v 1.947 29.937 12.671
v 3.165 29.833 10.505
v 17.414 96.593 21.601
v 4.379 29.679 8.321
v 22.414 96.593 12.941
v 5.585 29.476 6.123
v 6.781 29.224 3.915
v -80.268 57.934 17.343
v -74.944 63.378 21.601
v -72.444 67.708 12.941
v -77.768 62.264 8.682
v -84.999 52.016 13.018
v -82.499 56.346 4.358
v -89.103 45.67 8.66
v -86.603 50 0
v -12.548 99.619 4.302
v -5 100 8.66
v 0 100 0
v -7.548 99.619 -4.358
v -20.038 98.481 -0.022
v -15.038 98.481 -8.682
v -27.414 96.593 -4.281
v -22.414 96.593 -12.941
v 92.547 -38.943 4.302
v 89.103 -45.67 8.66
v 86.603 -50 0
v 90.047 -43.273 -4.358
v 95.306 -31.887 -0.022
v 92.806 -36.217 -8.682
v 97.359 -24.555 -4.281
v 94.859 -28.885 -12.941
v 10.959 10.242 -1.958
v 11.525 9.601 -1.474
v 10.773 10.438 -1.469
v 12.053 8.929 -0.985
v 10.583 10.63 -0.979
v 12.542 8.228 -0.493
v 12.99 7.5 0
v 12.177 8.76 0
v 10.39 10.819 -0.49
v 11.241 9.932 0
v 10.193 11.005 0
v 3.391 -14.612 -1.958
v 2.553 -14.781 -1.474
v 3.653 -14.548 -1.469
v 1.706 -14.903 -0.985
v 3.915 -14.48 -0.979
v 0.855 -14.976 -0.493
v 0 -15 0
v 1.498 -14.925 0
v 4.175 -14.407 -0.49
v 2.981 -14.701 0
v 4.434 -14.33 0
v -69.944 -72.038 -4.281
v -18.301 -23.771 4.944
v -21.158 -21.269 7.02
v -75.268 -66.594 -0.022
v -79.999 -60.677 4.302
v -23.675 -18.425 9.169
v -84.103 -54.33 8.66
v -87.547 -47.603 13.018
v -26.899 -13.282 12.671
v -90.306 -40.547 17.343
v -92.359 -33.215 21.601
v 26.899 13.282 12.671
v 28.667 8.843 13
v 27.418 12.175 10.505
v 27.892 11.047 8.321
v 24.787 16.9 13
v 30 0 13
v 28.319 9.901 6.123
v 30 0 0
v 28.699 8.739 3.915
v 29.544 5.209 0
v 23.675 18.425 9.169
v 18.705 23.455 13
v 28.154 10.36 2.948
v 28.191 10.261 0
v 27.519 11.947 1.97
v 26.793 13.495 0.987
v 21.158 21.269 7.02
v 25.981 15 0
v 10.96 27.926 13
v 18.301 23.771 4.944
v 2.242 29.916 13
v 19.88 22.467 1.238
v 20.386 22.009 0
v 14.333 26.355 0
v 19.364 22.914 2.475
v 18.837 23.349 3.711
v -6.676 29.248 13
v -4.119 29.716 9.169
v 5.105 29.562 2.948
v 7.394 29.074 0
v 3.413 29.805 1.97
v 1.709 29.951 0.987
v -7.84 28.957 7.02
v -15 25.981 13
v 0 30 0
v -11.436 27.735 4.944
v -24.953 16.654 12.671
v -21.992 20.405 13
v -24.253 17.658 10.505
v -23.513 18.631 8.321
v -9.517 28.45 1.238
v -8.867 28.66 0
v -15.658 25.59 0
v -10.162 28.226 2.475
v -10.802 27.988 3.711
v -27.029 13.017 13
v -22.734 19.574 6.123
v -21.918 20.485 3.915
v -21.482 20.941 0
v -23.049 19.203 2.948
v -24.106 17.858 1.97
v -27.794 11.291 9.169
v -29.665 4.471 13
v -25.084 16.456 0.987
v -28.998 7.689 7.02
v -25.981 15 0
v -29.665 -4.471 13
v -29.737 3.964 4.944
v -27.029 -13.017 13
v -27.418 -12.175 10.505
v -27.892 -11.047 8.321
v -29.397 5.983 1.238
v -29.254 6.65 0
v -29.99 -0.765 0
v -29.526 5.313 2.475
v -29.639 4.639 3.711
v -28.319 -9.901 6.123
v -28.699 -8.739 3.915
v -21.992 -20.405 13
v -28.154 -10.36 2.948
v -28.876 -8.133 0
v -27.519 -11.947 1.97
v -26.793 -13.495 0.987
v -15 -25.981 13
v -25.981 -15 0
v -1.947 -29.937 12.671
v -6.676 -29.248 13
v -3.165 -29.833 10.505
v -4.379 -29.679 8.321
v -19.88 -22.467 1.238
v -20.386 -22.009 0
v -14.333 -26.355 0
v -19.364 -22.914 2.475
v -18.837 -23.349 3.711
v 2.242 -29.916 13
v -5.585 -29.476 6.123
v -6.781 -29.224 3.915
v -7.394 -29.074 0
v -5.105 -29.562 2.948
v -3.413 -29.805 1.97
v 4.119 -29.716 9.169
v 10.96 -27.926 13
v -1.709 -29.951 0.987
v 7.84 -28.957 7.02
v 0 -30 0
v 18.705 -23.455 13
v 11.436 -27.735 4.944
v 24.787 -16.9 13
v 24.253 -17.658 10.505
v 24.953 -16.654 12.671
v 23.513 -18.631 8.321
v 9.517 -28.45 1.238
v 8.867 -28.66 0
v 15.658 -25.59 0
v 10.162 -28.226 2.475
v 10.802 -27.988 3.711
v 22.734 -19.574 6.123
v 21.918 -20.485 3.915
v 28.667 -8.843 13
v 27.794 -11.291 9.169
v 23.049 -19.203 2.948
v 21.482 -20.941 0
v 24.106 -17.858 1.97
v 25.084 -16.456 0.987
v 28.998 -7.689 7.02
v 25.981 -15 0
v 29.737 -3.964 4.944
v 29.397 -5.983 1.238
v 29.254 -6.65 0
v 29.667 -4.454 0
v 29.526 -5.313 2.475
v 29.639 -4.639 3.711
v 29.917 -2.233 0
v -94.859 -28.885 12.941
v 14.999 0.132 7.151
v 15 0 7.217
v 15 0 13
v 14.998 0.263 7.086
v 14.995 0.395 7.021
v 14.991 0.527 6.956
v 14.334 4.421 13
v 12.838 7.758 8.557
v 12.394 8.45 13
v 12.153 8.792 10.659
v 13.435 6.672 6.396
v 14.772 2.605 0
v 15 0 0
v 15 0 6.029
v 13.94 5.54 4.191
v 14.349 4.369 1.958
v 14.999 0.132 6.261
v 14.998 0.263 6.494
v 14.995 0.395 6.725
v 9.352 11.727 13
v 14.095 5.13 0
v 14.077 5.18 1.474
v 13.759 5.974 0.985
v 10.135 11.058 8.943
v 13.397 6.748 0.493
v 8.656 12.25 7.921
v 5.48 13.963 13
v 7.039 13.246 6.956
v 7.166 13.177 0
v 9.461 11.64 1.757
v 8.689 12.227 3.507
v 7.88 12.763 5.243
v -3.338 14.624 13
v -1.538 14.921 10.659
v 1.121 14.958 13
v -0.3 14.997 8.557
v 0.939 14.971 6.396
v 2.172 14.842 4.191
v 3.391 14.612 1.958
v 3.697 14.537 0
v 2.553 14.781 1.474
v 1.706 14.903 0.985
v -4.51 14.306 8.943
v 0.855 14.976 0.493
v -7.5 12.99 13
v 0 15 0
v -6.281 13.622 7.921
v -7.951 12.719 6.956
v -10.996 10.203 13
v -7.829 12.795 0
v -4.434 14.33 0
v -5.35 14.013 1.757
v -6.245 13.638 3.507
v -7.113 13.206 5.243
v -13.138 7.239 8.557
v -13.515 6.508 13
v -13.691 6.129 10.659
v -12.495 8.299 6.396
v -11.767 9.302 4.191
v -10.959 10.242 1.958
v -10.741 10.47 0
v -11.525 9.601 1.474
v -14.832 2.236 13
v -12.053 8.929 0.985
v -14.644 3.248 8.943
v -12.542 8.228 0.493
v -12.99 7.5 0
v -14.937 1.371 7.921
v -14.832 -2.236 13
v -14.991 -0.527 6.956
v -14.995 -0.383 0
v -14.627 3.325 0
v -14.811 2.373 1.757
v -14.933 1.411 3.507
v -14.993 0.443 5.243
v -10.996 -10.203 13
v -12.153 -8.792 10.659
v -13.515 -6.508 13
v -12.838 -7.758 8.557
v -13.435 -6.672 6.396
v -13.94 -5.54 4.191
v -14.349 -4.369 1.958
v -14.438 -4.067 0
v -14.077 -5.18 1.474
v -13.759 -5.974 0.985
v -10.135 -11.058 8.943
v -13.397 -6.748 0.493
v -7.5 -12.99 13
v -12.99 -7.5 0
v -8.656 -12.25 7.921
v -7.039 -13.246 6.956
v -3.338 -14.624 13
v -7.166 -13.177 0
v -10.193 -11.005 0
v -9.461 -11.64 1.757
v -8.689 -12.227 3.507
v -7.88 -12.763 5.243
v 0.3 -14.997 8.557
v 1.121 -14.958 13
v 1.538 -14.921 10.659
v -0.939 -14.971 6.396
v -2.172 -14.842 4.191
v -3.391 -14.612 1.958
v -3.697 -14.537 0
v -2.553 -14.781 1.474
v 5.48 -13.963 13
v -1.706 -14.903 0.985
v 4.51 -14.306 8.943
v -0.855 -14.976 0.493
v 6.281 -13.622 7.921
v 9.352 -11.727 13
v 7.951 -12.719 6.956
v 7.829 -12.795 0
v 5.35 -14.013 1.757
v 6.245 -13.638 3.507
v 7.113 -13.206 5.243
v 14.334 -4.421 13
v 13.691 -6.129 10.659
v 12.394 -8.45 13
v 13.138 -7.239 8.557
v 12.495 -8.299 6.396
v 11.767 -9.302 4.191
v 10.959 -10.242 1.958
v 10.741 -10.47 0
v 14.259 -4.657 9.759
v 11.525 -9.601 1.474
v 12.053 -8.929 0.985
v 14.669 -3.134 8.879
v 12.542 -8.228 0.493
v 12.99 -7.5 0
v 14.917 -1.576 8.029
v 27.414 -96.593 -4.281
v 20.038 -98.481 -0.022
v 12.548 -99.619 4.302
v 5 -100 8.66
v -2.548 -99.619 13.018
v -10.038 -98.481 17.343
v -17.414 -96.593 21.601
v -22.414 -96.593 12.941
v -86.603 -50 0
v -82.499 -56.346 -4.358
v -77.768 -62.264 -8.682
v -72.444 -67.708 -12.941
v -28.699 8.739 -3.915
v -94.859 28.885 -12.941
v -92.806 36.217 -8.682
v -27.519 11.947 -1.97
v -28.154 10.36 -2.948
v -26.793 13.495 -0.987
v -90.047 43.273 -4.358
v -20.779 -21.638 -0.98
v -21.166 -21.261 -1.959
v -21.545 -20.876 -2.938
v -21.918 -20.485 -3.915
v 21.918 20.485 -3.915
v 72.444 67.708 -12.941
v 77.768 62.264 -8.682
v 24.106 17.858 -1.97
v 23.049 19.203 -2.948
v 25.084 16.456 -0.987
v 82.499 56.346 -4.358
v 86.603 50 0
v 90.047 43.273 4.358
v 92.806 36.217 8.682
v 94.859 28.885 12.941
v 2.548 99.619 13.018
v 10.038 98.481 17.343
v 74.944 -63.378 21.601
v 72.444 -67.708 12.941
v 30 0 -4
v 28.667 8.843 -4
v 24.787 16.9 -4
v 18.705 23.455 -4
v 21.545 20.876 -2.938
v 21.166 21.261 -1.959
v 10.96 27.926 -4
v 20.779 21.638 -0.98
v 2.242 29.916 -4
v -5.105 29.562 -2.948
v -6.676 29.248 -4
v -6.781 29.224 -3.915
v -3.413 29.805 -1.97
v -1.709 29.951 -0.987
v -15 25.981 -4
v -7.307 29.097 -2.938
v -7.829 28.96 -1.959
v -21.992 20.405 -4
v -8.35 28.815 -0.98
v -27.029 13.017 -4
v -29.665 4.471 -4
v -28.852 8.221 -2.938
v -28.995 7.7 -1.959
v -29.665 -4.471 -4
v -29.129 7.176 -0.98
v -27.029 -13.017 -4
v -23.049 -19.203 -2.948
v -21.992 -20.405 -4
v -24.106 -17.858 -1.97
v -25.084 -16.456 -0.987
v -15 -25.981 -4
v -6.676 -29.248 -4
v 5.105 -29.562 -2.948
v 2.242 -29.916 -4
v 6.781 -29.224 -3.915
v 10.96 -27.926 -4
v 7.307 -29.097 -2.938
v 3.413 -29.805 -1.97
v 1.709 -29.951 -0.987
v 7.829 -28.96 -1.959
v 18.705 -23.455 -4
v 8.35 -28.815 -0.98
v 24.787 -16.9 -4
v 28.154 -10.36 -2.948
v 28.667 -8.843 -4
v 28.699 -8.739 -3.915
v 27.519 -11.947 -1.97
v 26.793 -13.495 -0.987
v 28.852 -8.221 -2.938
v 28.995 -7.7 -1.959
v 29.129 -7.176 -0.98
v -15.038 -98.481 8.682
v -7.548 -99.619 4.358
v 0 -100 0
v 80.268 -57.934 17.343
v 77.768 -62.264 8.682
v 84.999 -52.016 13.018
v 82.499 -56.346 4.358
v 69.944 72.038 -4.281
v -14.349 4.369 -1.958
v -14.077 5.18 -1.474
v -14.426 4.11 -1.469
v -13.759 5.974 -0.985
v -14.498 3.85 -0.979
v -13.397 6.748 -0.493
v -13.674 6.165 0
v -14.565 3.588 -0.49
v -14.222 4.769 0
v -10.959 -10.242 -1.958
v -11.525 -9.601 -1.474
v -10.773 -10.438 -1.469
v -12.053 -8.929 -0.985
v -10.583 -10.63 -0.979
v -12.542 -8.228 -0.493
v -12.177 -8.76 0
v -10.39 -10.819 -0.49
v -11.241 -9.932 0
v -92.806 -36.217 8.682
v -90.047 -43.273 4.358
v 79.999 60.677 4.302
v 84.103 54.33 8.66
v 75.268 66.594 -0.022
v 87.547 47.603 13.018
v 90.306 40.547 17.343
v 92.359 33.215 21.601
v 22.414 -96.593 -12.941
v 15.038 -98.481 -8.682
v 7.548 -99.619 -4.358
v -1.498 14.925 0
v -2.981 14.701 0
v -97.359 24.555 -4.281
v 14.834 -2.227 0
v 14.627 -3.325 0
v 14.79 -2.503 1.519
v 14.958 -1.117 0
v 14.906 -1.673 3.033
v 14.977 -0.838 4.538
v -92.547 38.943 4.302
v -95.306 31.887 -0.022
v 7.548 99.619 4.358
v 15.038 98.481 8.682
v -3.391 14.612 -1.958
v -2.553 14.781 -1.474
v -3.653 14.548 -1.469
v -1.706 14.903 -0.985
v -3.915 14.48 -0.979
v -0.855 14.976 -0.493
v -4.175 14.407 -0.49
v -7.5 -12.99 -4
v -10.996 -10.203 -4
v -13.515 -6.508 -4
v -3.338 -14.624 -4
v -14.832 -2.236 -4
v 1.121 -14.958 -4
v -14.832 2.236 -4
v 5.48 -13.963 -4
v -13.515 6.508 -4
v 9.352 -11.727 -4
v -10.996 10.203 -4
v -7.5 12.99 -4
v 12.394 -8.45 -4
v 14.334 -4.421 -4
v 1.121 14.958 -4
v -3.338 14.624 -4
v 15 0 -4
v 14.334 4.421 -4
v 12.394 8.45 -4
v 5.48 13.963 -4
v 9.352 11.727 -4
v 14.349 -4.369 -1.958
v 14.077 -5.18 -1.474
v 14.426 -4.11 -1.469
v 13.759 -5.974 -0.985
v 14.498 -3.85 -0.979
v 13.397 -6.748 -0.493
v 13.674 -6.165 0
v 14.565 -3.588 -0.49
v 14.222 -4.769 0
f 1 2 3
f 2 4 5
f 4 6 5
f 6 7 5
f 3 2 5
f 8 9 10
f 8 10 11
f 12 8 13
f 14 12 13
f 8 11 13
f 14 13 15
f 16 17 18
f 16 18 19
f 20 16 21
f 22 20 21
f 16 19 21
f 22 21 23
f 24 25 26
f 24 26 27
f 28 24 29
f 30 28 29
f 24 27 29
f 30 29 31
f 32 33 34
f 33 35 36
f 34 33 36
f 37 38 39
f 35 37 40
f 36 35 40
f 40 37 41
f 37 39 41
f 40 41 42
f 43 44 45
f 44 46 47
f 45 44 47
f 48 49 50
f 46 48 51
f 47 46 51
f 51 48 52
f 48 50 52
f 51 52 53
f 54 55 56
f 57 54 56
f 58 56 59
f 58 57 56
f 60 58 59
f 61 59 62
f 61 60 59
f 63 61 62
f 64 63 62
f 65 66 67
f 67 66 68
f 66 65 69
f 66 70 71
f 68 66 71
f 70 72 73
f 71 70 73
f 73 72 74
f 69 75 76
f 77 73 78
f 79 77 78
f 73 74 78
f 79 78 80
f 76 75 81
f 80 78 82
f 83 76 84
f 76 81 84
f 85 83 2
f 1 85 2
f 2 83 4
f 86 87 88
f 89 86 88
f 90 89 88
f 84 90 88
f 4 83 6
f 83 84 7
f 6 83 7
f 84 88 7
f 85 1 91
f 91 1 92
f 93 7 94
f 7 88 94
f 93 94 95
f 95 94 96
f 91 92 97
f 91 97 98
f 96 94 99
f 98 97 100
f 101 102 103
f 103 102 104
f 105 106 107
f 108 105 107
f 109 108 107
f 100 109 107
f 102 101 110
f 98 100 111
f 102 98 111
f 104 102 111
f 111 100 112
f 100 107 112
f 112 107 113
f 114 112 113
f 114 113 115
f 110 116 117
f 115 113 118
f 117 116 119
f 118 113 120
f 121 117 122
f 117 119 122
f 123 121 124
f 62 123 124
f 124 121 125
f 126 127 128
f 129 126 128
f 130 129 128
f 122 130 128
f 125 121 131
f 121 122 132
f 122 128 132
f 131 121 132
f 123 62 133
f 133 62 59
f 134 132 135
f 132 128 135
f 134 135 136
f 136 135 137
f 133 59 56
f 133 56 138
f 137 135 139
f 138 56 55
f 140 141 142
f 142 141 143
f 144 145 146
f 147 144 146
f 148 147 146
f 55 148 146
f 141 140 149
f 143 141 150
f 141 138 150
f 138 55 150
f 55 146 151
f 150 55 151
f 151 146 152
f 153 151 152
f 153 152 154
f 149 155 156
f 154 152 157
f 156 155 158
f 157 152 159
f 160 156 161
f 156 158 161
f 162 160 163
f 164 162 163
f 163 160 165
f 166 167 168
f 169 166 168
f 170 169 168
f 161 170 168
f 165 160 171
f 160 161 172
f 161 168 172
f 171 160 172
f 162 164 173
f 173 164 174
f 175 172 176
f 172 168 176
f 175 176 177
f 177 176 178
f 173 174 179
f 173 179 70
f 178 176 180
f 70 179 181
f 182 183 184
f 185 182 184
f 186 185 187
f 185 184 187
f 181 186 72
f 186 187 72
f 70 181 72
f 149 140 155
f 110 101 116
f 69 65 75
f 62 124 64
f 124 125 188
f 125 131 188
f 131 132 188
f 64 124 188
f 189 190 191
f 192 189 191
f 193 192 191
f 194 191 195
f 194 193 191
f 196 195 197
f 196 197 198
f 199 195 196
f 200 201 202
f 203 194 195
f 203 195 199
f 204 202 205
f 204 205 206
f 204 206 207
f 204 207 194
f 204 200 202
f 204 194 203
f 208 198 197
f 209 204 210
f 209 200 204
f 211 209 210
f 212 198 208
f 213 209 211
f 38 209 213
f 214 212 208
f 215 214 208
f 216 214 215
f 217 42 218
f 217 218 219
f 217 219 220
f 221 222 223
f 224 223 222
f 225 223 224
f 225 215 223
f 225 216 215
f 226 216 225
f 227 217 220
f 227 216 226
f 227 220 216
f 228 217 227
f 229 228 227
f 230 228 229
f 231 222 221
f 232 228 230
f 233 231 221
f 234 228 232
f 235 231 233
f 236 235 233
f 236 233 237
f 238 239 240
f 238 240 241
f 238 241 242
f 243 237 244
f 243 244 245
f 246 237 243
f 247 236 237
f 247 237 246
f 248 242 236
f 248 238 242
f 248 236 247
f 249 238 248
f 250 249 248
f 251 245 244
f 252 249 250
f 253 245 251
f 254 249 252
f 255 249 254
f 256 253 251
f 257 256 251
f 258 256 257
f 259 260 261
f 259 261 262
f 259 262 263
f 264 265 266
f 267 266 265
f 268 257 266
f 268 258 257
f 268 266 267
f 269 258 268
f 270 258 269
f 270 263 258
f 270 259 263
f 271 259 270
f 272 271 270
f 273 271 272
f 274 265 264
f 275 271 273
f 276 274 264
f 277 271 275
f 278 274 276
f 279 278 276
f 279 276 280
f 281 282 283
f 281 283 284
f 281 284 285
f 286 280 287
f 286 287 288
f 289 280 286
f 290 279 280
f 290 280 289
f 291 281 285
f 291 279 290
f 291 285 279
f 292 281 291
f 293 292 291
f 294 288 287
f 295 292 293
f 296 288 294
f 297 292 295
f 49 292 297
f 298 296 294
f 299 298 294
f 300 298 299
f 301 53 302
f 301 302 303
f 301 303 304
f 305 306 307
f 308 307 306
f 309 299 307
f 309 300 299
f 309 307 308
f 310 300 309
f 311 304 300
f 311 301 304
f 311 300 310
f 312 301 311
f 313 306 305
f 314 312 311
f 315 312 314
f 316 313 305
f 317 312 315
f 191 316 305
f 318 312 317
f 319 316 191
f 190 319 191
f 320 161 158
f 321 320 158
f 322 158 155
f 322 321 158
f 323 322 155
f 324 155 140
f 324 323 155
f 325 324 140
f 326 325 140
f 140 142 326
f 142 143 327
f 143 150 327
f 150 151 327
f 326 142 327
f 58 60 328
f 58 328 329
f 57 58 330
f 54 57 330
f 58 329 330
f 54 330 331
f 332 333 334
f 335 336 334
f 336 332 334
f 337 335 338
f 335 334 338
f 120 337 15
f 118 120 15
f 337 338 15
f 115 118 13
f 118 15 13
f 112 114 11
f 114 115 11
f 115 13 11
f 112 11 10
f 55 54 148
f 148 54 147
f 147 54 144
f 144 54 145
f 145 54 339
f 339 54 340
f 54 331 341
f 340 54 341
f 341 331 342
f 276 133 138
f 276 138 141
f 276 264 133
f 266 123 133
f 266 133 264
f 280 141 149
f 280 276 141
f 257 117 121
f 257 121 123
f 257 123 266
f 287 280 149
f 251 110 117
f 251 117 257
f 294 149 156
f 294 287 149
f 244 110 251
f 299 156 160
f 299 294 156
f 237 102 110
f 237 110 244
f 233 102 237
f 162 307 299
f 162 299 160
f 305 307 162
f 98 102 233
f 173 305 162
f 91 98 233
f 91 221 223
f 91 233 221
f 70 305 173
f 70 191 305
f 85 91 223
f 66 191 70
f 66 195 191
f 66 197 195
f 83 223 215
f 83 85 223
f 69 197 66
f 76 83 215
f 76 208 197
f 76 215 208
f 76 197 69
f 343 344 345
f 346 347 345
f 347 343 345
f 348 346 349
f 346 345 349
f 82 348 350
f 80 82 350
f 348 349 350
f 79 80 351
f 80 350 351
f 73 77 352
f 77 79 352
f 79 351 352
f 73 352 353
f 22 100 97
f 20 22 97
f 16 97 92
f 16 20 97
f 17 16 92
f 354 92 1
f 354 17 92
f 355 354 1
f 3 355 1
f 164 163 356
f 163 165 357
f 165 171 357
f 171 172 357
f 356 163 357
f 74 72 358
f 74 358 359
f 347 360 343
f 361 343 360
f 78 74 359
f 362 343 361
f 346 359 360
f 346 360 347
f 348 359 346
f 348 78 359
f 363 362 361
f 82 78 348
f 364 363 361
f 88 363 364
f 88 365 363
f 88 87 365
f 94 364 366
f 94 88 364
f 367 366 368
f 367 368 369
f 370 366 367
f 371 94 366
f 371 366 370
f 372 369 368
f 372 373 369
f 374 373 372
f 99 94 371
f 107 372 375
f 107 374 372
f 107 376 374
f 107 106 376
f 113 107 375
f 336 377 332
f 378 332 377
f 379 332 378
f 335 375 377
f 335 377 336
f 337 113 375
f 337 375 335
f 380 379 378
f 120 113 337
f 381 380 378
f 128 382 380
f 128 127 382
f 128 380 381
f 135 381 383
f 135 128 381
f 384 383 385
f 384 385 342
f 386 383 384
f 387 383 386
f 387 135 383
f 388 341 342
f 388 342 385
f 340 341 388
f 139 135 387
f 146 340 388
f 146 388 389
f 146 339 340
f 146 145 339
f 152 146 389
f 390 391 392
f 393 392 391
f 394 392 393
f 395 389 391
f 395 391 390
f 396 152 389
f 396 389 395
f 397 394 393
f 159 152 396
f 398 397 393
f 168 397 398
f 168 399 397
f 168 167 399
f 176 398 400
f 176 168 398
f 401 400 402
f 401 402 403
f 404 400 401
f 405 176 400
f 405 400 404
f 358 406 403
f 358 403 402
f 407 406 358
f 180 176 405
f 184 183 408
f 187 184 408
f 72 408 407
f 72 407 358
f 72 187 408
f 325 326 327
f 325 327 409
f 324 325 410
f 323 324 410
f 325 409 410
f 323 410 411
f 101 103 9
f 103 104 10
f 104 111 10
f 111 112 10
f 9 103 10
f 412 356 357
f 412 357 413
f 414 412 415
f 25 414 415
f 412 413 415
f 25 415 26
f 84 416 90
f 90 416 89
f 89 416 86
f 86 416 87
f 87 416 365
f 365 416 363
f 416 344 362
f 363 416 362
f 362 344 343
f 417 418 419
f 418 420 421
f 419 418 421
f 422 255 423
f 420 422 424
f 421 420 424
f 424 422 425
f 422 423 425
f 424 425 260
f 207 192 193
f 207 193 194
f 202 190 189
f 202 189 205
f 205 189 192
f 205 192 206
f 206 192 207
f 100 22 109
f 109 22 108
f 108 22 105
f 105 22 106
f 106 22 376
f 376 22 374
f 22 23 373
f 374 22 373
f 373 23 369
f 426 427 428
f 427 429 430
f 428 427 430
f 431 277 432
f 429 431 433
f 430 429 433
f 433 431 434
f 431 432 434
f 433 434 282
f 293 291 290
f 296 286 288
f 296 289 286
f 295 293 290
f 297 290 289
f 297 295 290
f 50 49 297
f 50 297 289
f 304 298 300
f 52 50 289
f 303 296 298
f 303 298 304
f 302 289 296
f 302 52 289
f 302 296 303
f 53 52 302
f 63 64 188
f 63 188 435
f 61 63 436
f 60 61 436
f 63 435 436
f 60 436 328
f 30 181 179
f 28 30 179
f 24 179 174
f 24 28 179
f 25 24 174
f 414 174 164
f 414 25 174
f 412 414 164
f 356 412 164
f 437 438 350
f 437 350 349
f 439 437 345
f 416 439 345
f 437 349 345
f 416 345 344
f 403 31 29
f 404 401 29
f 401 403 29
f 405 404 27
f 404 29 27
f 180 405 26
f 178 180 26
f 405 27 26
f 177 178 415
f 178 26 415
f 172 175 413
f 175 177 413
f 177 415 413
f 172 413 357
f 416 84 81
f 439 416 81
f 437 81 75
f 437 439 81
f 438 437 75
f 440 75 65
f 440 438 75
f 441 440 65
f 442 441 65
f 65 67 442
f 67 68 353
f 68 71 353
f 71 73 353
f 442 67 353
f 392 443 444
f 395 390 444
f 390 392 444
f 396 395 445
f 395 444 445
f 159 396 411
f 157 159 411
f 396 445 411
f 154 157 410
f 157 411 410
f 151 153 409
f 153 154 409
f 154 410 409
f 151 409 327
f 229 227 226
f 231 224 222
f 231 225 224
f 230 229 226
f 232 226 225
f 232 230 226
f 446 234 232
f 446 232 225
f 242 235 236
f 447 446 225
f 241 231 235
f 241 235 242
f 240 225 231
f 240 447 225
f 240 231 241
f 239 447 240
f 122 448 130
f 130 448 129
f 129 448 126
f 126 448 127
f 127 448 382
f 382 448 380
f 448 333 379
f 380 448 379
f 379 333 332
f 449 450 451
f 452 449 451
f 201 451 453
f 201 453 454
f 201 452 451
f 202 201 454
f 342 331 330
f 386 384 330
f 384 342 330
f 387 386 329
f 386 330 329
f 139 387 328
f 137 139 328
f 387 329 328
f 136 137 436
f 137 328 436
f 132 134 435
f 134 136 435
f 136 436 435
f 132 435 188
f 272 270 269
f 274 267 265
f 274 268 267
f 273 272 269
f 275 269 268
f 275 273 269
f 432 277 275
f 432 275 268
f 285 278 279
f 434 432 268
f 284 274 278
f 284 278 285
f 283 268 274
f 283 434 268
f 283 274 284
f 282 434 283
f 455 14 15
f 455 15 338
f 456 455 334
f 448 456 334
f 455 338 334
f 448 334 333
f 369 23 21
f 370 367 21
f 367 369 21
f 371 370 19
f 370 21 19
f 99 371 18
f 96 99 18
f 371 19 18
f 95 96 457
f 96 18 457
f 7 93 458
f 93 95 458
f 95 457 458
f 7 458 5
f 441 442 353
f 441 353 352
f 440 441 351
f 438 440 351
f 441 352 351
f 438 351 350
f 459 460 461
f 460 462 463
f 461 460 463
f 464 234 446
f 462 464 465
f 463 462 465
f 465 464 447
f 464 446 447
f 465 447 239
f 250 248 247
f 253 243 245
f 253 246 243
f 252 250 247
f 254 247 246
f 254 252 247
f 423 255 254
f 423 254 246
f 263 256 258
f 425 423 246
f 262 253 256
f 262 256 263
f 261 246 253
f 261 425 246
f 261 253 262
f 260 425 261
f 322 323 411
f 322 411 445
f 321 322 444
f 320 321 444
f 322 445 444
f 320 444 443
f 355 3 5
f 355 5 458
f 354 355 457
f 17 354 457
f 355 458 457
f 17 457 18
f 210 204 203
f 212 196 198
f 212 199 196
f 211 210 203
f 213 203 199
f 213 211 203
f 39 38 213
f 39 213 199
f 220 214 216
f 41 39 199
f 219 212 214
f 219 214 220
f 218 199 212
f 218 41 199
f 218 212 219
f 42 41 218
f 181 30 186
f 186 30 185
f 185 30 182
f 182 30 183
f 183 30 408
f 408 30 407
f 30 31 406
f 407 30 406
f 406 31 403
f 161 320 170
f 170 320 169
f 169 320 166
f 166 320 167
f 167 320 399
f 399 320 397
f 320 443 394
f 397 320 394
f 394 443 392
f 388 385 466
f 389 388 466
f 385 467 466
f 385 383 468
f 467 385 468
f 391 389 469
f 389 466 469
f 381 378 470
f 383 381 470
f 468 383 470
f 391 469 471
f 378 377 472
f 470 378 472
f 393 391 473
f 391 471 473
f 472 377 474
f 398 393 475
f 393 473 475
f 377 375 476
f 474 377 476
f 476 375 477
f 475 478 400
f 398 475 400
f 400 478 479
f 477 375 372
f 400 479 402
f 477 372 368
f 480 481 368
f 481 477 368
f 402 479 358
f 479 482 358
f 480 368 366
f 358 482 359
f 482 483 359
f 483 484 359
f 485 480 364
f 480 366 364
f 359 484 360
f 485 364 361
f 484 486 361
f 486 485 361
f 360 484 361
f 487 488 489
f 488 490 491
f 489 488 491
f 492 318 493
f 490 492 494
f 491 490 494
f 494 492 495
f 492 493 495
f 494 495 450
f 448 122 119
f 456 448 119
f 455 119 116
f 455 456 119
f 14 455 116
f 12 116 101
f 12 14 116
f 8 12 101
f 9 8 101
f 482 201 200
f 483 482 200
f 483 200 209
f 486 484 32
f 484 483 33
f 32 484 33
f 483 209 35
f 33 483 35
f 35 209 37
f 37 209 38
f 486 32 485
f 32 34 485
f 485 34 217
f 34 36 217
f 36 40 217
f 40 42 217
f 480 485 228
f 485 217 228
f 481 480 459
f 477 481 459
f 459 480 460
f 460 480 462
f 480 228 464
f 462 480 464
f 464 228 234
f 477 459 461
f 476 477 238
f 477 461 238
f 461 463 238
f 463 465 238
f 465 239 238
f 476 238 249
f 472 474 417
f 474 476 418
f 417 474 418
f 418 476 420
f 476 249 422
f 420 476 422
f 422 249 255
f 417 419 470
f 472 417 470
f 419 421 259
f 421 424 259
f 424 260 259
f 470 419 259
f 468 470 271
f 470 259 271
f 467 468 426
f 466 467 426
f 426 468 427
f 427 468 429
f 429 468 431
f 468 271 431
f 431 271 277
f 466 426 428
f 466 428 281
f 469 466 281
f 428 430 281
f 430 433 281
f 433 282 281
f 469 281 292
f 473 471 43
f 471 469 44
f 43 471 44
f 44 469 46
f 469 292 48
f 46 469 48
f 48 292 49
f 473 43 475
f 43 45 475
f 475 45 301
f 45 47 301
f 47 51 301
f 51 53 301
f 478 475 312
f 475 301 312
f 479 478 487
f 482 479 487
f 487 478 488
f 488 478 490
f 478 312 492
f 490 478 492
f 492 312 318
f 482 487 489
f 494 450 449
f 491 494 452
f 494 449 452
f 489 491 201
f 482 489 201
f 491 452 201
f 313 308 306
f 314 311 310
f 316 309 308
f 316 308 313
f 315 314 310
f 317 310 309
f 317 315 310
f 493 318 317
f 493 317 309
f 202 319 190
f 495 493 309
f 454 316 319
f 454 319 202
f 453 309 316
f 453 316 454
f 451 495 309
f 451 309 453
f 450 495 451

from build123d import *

# Parameters (mm, degrees)
F1_DEPTH      = 10
F3_ANGLE      = 30
F5_COUNT      = 6
F6_R          = 30
F6_R_2        = 15
F7_DEPTH      = 13
F7_DEPTH_BACK = 4
F8_R          = 15
F9_DEPTH      = 25
F9_DEPTH_BACK = 25


with BuildPart() as f1:
    # F0 (on Top) → F1 (new body)
    with BuildSketch(Plane.XY):
        with BuildLine():
            Line((0, 0), (25.8819045103, 96.5925826289))
            ThreePointArc((25.8819045103, 96.5925826289), (13.052619222, 99.1444861374), (0, 100))
            Line((0, 100), (0, 0))
        make_face()
        with BuildLine():
            Line((0, 0), (0, 100))
            ThreePointArc((0, 100), (-13.052619222, 99.1444861374), (-25.8819045103, 96.5925826289))
            Line((-25.8819045103, 96.5925826289), (0, 0))
        make_face()
    extrude(amount=F1_DEPTH)


with BuildPart() as f1_1:
    # F3: moved
    add(f1.part.rotate(Axis((0, 41.2369845435, 0), (0, -1, 0)), F3_ANGLE))

    # F5: F1 ×6 about axis
    f5_axis = Axis((0, 0, 3.0173412524), (0, 0, -1))


with BuildPart() as f1_2:
    add(f1_1.part)
    for i in range(1, F5_COUNT):
        add(f1_1.part.rotate(f5_axis, i * 360 / F5_COUNT))

    # F6 (on Top) → F7 (join, two sides)
    with BuildSketch(Plane.XY) as f7_sk:
        Circle(F6_R)
        Circle(F6_R_2, mode=Mode.SUBTRACT)
    extrude(amount=F7_DEPTH)
    extrude(f7_sk.sketch, amount=-F7_DEPTH_BACK)

    # F8 (on Top) → F9 (cut, two sides)
    with BuildSketch(Plane.XY) as f9_sk:
        Circle(F8_R)
    extrude(amount=-F9_DEPTH, mode=Mode.SUBTRACT)
    extrude(f9_sk.sketch, amount=F9_DEPTH_BACK, mode=Mode.SUBTRACT)


solid = f1_2.part
